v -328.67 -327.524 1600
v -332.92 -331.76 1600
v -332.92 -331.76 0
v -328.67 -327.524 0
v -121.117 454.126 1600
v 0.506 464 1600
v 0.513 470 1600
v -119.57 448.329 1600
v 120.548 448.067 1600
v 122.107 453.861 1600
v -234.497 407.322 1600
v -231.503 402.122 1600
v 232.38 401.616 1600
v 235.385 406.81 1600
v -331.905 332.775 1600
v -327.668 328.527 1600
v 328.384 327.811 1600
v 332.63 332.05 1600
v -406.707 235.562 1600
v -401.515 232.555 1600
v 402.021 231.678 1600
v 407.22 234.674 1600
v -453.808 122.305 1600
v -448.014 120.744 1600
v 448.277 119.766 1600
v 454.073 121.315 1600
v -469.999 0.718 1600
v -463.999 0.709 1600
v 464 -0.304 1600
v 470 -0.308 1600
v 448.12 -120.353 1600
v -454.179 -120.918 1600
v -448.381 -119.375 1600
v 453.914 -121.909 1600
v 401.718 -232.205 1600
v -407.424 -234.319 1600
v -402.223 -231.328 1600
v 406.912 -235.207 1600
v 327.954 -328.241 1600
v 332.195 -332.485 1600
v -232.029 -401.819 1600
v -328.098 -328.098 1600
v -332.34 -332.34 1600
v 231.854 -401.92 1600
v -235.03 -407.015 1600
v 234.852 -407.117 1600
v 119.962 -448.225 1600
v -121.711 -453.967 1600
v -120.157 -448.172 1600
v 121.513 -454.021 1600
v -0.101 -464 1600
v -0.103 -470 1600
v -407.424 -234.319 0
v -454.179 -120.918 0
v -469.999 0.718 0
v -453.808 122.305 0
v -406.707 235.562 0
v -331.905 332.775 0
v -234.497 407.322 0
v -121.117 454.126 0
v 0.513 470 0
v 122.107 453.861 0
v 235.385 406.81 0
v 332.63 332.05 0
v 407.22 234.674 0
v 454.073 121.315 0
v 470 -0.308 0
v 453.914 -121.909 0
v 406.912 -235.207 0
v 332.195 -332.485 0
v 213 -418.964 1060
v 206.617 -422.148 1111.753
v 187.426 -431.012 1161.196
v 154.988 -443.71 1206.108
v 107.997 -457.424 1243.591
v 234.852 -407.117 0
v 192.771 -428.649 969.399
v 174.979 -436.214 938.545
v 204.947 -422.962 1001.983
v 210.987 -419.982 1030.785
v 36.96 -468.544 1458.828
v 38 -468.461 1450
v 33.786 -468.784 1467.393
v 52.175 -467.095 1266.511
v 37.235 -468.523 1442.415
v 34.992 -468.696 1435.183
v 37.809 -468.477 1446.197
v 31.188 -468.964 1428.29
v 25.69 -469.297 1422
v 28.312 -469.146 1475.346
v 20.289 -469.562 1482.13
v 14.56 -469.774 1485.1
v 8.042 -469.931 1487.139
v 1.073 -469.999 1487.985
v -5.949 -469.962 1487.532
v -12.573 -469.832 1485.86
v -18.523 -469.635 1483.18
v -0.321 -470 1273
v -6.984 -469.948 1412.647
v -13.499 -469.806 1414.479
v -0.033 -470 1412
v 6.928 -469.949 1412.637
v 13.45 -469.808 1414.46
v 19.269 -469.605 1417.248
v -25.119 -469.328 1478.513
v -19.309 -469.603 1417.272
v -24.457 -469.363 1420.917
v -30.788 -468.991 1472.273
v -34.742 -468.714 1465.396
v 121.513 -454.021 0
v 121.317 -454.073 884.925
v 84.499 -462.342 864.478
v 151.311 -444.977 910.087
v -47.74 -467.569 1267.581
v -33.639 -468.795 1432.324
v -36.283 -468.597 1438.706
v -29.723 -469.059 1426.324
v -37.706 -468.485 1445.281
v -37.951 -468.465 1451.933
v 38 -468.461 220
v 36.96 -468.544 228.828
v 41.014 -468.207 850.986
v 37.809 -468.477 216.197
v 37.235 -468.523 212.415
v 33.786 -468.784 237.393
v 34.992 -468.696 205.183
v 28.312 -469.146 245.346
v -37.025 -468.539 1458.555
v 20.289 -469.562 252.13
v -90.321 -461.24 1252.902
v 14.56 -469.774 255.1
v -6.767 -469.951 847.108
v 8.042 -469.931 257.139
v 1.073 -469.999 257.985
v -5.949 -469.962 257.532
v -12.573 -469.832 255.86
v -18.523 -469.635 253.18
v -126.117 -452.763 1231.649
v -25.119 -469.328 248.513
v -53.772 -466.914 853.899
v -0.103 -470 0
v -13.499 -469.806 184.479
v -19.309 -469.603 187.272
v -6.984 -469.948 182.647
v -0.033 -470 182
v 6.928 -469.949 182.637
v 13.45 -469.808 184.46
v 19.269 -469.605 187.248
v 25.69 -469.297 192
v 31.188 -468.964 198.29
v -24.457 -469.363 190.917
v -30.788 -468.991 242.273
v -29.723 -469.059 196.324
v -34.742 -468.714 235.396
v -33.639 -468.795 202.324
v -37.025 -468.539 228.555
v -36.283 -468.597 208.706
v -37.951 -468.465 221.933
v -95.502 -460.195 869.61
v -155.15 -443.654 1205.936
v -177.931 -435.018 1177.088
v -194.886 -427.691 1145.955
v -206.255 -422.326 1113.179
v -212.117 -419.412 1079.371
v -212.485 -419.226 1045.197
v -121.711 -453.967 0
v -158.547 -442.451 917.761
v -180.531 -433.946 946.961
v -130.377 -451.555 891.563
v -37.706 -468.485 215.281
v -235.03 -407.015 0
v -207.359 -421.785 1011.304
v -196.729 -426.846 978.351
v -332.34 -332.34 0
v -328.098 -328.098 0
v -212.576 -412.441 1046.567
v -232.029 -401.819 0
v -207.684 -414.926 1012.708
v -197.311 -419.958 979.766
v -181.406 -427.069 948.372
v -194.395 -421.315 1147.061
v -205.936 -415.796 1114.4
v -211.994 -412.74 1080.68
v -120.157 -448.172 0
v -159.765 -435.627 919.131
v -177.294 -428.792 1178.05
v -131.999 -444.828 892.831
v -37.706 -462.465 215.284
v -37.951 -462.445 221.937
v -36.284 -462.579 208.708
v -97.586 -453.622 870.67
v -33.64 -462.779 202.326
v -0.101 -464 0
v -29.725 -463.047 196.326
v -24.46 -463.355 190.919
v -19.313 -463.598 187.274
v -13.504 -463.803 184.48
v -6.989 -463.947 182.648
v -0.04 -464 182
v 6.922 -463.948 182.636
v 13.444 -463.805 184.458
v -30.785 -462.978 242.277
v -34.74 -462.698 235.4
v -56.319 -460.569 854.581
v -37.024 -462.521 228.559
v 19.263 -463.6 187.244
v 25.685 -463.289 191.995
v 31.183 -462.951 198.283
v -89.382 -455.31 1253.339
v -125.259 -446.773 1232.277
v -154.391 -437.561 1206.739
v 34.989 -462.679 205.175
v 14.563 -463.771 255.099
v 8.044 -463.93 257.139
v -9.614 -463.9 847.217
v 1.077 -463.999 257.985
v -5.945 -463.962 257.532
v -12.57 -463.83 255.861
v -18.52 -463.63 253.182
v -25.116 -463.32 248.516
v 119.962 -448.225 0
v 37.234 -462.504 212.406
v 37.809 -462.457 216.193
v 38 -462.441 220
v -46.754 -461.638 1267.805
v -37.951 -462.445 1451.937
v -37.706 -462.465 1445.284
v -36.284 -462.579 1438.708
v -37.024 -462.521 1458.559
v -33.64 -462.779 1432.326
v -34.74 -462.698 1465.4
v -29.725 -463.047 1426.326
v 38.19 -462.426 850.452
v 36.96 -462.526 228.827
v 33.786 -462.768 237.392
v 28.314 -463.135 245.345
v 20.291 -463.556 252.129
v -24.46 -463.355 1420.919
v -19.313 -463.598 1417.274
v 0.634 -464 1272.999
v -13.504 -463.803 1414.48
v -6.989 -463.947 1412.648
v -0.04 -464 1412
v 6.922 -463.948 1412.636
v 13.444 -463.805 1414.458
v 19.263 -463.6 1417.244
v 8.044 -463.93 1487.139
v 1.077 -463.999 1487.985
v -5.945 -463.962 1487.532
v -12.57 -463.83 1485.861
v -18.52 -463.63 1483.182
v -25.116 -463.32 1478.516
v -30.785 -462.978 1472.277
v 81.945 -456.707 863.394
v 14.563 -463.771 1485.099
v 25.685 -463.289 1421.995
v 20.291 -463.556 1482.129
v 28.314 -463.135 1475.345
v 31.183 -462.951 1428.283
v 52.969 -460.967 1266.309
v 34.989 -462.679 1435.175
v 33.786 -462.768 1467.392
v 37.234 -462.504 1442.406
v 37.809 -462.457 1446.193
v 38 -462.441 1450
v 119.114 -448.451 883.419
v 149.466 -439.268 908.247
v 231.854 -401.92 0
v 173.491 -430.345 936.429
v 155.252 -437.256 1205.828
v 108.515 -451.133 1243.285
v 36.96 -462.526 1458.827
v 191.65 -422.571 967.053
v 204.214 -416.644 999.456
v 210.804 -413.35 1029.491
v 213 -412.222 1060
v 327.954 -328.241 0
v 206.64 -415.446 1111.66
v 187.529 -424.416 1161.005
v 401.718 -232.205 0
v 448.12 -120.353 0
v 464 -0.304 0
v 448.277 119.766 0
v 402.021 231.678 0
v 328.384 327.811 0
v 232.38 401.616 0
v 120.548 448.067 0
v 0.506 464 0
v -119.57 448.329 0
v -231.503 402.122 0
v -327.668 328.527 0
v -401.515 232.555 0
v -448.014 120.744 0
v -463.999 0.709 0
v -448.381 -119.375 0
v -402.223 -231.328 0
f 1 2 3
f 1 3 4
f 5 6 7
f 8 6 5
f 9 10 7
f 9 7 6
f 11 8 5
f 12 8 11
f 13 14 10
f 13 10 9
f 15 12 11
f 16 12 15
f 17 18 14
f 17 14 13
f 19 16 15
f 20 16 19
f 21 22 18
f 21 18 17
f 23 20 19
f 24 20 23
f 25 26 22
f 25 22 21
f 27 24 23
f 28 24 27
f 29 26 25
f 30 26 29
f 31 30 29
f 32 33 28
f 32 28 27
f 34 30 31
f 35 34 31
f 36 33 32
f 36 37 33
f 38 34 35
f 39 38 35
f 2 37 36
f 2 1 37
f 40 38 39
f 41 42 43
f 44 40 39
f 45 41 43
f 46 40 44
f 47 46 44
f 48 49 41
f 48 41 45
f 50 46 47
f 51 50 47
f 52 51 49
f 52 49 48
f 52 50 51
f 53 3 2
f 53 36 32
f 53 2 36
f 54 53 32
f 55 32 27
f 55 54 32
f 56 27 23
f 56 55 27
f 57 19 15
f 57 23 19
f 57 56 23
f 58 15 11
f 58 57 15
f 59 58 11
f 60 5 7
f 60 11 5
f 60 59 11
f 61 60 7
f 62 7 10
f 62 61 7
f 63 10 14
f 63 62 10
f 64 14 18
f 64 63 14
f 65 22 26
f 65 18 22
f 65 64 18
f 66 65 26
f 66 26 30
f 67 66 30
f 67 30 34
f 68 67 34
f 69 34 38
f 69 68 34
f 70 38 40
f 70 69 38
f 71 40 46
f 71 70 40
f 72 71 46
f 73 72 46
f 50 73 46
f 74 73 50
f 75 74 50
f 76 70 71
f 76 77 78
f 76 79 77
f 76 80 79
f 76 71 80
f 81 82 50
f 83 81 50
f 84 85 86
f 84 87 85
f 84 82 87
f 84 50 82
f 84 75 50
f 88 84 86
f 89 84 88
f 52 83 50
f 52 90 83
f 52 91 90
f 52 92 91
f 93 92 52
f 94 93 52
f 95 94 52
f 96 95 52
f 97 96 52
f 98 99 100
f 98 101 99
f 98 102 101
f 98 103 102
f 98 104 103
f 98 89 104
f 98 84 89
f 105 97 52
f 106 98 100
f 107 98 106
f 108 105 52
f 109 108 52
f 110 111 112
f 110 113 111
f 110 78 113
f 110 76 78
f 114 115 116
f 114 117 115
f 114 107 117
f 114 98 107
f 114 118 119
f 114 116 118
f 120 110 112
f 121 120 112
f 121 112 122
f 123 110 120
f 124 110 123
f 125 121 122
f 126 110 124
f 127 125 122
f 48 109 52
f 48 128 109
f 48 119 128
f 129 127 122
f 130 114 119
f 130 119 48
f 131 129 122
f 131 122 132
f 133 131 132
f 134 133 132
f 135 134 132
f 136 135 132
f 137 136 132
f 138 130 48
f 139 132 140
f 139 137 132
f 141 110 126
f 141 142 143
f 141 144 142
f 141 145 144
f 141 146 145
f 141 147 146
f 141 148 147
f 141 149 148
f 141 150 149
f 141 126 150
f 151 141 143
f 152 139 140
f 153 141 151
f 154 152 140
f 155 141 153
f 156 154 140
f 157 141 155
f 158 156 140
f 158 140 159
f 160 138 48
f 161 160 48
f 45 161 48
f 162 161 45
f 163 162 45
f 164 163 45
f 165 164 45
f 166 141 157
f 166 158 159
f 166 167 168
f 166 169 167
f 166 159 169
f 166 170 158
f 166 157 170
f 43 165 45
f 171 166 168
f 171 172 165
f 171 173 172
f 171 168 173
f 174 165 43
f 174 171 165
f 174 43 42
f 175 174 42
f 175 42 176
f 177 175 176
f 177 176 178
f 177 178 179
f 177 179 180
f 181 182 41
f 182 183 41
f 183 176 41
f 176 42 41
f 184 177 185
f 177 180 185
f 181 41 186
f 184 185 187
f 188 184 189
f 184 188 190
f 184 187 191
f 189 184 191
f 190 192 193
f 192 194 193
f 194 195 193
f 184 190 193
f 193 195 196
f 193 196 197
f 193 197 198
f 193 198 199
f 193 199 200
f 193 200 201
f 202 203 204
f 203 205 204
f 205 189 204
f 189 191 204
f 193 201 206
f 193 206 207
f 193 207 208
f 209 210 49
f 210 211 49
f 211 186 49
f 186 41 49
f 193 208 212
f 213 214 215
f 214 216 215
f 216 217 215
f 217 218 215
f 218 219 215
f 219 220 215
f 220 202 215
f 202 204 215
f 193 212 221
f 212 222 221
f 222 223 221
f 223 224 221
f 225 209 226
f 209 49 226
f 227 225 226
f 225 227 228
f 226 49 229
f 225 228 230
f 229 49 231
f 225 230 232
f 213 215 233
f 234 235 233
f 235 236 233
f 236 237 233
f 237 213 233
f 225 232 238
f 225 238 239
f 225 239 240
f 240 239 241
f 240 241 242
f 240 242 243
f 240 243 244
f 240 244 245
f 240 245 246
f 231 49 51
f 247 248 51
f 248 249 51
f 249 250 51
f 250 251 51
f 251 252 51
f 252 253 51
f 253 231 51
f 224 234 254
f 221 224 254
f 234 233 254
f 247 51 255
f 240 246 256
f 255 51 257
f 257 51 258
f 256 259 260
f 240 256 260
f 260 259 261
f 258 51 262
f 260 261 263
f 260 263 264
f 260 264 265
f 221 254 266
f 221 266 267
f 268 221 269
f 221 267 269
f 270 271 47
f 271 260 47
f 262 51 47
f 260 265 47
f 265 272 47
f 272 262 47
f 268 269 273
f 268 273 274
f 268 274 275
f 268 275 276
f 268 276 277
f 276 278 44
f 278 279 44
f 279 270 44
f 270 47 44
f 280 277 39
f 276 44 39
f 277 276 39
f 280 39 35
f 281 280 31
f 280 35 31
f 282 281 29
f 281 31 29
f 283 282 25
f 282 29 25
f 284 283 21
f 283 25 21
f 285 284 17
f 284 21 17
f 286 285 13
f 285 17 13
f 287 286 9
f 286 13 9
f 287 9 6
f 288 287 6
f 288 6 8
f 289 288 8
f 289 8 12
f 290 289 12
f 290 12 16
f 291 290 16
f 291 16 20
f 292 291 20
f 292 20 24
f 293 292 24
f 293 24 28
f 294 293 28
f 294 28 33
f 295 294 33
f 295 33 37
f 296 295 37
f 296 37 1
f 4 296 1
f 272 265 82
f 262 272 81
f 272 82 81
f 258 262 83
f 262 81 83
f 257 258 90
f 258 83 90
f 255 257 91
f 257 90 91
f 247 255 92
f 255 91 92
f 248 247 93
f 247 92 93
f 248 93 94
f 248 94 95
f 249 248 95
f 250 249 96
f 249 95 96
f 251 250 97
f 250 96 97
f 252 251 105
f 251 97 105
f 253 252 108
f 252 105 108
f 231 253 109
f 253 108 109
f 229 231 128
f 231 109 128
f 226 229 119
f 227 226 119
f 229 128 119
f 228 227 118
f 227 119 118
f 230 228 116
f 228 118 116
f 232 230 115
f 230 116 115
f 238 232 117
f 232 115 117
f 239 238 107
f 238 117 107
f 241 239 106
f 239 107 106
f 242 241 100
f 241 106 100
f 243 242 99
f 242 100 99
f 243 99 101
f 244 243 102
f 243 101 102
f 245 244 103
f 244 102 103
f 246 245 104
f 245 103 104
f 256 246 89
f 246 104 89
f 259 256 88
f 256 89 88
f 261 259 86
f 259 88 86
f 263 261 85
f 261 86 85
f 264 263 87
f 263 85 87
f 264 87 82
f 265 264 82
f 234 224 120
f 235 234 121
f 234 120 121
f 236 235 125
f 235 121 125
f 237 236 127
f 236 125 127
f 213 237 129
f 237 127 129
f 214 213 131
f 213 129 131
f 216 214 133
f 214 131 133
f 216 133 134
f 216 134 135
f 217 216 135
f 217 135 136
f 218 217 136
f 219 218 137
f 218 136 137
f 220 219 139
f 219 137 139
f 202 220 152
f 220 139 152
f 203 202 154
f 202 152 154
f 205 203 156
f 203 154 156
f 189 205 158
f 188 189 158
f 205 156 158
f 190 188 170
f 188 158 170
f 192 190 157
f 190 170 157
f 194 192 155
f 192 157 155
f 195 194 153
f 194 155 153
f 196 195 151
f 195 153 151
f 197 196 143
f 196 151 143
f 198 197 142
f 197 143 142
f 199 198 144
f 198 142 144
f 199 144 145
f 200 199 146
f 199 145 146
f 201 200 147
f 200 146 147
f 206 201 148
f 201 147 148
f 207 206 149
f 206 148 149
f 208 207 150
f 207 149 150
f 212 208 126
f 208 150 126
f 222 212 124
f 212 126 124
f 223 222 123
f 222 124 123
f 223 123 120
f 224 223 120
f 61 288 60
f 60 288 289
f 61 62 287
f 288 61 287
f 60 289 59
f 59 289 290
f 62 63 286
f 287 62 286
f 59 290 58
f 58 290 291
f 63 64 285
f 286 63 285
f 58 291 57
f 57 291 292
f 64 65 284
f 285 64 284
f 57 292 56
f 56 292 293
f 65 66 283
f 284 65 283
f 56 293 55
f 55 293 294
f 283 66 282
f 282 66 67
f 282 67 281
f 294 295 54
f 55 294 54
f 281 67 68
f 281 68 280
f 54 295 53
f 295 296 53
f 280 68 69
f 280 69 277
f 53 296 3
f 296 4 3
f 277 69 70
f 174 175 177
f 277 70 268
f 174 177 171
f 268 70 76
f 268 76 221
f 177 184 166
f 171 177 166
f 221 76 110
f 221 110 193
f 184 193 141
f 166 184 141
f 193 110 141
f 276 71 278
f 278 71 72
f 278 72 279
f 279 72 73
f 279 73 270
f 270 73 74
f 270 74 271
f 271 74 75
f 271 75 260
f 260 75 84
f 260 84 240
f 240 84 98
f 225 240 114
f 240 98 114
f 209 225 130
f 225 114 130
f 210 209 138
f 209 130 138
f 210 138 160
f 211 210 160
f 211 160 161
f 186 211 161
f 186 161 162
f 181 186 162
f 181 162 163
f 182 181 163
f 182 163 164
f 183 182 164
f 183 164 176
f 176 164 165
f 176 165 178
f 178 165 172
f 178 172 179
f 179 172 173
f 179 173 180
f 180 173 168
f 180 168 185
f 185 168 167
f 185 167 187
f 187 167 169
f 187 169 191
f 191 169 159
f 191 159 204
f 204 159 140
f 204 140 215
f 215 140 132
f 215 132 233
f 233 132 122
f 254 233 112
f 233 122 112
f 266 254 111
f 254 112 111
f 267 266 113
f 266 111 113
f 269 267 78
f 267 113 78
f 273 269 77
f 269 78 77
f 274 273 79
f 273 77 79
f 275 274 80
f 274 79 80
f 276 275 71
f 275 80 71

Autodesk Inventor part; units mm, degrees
sketch "floor angle sketch" plane through (0, 0, 0) normal (0, 0, 1) x (1, 0, 0)
  line L0 (0, 0) -> (0, -240.1382) construction
  line L1 (0, 0) -> (0, -870)
  line L2 (-332.3402, -332.3402) -> (332.3402, 332.3402) construction
  circle A0 centre (0, 0) radius 470 construction
  line L3 (0, 0) -> (0, -670)
  line L4 (-38, -670) -> (38, -670)
  line L5 (-213, -870) -> (213, -870)
  line L6 (0, 0) -> (-263.3555, -723.5633)
  line L7 (0, 0) -> (0, -570)
  line L8 (-38, -570) -> (38, -570)
  line L9 (-324.4355, -701.332) -> (-202.2755, -745.7946)
  dimension "d51" = 940
  dimension "d52" = 45
  dimension "d54" = 0
  dimension "d55" = 0
  dimension "d56" = 426
  dimension "d58" = 76
  dimension "d59" = 76
  dimension "d60" = 0
  dimension "d61" = 570
  dimension "d62" = 130
  dimension "d63" = 20
  dimension "d64" = 670
  dimension "d65" = 770
  dimension "d66" = 870
ref_plane "SHELL Plane" through (-332.3402, -332.3402, 0) normal (0.7071, -0.7071, 0) x (0.7071, 0.7071, 0)
ref_plane "ACCESS Plane" through (-213, -870, 0) normal (0, -1, 0) x (1, 0, 0)
ref_plane "OUTER Plane" through (-38, -670, 0) normal (0, -1, 0) x (1, 0, 0)
ref_plane "INNER Plane" through (-38, -570, 0) normal (0, -1, 0) x (1, 0, 0)
ref_plane "CHARGE Plane" through (-324.4355, -701.332, 0) normal (-0.342, -0.9397, 0) x (0.9397, -0.342, 0)
sketch "Sketch13" plane through (-332.3402, -332.3402, 0) normal (0.7071, -0.7071, 0) x (0.7071, 0.7071, 0)
  line L0 (470, 0) -> (470, 892.6829)
  line L1 (0, 0) -> (6, 0)
  line L2 (6, 0) -> (6, 1600)
  line L3 (6, 1600) -> (0, 1600)
  line L4 (0, 1600) -> (0, 0)
  dimension "d75" = 1600
  dimension "d76" = 6
  dimension "d77" = 940
revolve "Revolution2" add sketch "Sketch13" angle 359.9 about axis through (0, 0, 0) along (0, 0, 1)
sketch "Sketch14" plane through (-213, -870, 0) normal (0, -1, 0) x (1, 0, 0)
  circle A0 centre (213, 1060) radius 213
  line L0 (683, 1600) -> (-257, 1600) projected
  point P0 (213, 0)
  point P1 (-119.3402, 1600)
  point P2 (-119.9197, 1600)
  dimension "d80" = 426
  dimension "d93" = 540
extrude "ACCESS" cut sketch "Sketch14" against normal up to next
sketch "Sketch15" plane through (-38, -570, 0) normal (0, -1, 0) x (1, 0, 0)
  circle A0 centre (38, 220) radius 38
  point P0 (38, 0)
  dimension "d84" = 76
  dimension "d85" = 220
extrude "INNER" cut sketch "Sketch15" against normal up to next
sketch "Sketch16" plane through (-38, -670, 0) normal (0, -1, 0) x (1, 0, 0)
  circle A0 centre (38, 1450) radius 38
  line L0 (508, 1600) -> (-432, 1600) projected
  point P0 (38, 0)
  point P1 (-294.3402, 1600)
  point P2 (-294.9197, 1600)
  dimension "d89" = 76
  dimension "d92" = 150
extrude "Extrusion9" cut sketch "Sketch16" against normal up to next
equation "\"BendRadius\" = Thickness"
equation "\"BendReliefWidth\" = Thickness"
equation "\"BendReliefDepth\" = 0.5 * Thickness"
equation "\"CornerReliefSize\" = 4 * Thickness"
equation "\"MinimumRemnant\" = 2 * Thickness"
equation "\"TransitionRadius\" = BendRadius"
equation "\"JacobiRadiusSize\" = BendRadius"
equation "\"GapSize\" = Thickness"
equation "\"Thickness\" = 6"
properties part number "TZS 0902 SHELL" material "Steel"
